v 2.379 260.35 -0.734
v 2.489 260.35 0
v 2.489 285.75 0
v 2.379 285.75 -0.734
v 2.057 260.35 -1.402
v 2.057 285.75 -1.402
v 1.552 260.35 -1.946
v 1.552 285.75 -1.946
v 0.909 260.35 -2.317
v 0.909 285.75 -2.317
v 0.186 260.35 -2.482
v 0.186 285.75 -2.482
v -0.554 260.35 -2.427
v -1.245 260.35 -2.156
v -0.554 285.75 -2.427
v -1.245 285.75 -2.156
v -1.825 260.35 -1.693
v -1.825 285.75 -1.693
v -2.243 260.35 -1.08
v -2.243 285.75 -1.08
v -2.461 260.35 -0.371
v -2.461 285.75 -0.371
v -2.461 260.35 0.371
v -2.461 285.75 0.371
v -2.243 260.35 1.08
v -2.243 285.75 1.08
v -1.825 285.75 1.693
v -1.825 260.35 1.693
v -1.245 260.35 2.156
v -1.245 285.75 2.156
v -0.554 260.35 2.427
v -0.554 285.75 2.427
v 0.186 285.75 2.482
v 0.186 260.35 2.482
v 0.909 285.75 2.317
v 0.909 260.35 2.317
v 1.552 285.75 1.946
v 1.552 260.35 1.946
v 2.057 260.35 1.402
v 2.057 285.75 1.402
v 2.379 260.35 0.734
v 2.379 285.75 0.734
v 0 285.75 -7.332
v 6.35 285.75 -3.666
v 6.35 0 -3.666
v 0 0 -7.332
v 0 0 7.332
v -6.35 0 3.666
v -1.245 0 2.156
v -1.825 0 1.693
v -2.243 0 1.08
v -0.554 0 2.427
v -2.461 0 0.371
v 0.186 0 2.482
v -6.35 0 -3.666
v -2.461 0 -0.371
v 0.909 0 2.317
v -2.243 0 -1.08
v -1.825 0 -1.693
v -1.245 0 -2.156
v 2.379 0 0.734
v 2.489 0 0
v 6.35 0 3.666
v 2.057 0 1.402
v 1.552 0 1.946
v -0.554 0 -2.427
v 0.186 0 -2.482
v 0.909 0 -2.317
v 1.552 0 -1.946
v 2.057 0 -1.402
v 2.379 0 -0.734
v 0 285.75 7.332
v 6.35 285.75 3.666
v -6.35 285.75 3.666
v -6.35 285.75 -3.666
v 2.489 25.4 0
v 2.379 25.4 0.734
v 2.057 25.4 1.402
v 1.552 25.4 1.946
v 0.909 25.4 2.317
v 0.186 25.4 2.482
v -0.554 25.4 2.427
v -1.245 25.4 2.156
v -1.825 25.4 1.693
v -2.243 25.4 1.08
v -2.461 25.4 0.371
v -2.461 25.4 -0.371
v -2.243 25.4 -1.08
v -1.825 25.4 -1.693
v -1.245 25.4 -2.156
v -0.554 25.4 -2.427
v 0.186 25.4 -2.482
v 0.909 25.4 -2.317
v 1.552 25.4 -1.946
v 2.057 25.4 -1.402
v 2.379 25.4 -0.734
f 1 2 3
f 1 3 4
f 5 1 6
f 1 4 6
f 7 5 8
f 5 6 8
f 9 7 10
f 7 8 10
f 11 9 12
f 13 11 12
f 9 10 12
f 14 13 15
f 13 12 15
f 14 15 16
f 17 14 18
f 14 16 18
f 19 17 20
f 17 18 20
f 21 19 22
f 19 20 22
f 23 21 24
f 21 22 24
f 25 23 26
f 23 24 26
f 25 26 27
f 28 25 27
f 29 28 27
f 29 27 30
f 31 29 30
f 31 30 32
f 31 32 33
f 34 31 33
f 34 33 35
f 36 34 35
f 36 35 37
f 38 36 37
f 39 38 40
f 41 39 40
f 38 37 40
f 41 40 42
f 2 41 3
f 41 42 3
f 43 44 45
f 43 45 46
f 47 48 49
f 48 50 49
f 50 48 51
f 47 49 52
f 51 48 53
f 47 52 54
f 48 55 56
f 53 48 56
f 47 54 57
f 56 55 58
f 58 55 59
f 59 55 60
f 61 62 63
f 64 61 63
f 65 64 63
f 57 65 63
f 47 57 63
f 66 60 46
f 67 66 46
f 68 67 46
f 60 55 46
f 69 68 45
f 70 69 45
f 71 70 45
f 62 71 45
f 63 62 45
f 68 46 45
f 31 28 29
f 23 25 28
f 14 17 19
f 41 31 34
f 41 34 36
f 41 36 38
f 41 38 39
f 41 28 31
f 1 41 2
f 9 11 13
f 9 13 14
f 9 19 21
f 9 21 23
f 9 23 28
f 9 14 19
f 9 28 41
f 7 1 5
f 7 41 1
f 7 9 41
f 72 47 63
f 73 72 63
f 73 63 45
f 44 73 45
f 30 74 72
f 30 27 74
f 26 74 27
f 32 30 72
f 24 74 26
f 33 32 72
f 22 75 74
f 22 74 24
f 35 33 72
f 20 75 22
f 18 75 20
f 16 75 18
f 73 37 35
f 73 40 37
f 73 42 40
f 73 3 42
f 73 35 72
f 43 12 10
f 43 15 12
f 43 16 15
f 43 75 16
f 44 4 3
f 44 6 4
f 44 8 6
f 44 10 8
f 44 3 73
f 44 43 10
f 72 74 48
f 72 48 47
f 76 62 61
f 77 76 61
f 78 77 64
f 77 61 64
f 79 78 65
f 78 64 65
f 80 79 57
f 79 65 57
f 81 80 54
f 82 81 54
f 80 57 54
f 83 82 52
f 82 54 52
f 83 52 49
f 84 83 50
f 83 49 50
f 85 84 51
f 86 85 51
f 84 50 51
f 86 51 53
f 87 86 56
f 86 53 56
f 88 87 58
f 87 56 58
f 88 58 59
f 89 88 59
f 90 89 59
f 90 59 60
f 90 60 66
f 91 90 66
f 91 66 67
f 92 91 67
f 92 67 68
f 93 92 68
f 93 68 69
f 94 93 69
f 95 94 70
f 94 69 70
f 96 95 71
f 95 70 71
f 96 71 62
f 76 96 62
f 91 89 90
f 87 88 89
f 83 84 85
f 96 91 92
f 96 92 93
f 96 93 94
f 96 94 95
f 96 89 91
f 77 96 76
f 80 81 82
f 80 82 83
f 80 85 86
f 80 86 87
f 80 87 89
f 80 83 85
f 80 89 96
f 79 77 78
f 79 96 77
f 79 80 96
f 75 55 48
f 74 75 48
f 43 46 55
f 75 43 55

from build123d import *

# Parameters (mm, degrees)
BOSS_EXTRUDE1_DEPTH = 285.75
SKETCH2_R           = 2.4892
CUT_EXTRUDE1_DEPTH  = 25.4
SKETCH3_R           = 2.4892
CUT_EXTRUDE2_DEPTH  = 25.4


with BuildPart() as part:
    # Sketch1 → Boss-Extrude1 (new body)
    with BuildSketch(Plane(origin=(0, 0, 0), x_dir=(1, 0, 0), z_dir=(0, 1, 0))):
        Polygon((6.35, 3.666174209), (0, 7.332348419), (-6.35, 3.666174209), (-6.35, -3.666174209), (0, -7.332348419), (6.35, -3.666174209), align=None)
    extrude(amount=BOSS_EXTRUDE1_DEPTH)

    # Sketch2 → Cut-Extrude1 (cut)
    with BuildSketch(Plane.XZ):
        Circle(SKETCH2_R)
    extrude(amount=-CUT_EXTRUDE1_DEPTH, mode=Mode.SUBTRACT)

    # Sketch3 → Cut-Extrude2 (cut)
    with BuildSketch(Plane(origin=(0, 285.75, 0), x_dir=(1, 0, 0), z_dir=(0, 1, 0))):
        Circle(SKETCH3_R)
    extrude(amount=-CUT_EXTRUDE2_DEPTH, mode=Mode.SUBTRACT)


solid = part.part
